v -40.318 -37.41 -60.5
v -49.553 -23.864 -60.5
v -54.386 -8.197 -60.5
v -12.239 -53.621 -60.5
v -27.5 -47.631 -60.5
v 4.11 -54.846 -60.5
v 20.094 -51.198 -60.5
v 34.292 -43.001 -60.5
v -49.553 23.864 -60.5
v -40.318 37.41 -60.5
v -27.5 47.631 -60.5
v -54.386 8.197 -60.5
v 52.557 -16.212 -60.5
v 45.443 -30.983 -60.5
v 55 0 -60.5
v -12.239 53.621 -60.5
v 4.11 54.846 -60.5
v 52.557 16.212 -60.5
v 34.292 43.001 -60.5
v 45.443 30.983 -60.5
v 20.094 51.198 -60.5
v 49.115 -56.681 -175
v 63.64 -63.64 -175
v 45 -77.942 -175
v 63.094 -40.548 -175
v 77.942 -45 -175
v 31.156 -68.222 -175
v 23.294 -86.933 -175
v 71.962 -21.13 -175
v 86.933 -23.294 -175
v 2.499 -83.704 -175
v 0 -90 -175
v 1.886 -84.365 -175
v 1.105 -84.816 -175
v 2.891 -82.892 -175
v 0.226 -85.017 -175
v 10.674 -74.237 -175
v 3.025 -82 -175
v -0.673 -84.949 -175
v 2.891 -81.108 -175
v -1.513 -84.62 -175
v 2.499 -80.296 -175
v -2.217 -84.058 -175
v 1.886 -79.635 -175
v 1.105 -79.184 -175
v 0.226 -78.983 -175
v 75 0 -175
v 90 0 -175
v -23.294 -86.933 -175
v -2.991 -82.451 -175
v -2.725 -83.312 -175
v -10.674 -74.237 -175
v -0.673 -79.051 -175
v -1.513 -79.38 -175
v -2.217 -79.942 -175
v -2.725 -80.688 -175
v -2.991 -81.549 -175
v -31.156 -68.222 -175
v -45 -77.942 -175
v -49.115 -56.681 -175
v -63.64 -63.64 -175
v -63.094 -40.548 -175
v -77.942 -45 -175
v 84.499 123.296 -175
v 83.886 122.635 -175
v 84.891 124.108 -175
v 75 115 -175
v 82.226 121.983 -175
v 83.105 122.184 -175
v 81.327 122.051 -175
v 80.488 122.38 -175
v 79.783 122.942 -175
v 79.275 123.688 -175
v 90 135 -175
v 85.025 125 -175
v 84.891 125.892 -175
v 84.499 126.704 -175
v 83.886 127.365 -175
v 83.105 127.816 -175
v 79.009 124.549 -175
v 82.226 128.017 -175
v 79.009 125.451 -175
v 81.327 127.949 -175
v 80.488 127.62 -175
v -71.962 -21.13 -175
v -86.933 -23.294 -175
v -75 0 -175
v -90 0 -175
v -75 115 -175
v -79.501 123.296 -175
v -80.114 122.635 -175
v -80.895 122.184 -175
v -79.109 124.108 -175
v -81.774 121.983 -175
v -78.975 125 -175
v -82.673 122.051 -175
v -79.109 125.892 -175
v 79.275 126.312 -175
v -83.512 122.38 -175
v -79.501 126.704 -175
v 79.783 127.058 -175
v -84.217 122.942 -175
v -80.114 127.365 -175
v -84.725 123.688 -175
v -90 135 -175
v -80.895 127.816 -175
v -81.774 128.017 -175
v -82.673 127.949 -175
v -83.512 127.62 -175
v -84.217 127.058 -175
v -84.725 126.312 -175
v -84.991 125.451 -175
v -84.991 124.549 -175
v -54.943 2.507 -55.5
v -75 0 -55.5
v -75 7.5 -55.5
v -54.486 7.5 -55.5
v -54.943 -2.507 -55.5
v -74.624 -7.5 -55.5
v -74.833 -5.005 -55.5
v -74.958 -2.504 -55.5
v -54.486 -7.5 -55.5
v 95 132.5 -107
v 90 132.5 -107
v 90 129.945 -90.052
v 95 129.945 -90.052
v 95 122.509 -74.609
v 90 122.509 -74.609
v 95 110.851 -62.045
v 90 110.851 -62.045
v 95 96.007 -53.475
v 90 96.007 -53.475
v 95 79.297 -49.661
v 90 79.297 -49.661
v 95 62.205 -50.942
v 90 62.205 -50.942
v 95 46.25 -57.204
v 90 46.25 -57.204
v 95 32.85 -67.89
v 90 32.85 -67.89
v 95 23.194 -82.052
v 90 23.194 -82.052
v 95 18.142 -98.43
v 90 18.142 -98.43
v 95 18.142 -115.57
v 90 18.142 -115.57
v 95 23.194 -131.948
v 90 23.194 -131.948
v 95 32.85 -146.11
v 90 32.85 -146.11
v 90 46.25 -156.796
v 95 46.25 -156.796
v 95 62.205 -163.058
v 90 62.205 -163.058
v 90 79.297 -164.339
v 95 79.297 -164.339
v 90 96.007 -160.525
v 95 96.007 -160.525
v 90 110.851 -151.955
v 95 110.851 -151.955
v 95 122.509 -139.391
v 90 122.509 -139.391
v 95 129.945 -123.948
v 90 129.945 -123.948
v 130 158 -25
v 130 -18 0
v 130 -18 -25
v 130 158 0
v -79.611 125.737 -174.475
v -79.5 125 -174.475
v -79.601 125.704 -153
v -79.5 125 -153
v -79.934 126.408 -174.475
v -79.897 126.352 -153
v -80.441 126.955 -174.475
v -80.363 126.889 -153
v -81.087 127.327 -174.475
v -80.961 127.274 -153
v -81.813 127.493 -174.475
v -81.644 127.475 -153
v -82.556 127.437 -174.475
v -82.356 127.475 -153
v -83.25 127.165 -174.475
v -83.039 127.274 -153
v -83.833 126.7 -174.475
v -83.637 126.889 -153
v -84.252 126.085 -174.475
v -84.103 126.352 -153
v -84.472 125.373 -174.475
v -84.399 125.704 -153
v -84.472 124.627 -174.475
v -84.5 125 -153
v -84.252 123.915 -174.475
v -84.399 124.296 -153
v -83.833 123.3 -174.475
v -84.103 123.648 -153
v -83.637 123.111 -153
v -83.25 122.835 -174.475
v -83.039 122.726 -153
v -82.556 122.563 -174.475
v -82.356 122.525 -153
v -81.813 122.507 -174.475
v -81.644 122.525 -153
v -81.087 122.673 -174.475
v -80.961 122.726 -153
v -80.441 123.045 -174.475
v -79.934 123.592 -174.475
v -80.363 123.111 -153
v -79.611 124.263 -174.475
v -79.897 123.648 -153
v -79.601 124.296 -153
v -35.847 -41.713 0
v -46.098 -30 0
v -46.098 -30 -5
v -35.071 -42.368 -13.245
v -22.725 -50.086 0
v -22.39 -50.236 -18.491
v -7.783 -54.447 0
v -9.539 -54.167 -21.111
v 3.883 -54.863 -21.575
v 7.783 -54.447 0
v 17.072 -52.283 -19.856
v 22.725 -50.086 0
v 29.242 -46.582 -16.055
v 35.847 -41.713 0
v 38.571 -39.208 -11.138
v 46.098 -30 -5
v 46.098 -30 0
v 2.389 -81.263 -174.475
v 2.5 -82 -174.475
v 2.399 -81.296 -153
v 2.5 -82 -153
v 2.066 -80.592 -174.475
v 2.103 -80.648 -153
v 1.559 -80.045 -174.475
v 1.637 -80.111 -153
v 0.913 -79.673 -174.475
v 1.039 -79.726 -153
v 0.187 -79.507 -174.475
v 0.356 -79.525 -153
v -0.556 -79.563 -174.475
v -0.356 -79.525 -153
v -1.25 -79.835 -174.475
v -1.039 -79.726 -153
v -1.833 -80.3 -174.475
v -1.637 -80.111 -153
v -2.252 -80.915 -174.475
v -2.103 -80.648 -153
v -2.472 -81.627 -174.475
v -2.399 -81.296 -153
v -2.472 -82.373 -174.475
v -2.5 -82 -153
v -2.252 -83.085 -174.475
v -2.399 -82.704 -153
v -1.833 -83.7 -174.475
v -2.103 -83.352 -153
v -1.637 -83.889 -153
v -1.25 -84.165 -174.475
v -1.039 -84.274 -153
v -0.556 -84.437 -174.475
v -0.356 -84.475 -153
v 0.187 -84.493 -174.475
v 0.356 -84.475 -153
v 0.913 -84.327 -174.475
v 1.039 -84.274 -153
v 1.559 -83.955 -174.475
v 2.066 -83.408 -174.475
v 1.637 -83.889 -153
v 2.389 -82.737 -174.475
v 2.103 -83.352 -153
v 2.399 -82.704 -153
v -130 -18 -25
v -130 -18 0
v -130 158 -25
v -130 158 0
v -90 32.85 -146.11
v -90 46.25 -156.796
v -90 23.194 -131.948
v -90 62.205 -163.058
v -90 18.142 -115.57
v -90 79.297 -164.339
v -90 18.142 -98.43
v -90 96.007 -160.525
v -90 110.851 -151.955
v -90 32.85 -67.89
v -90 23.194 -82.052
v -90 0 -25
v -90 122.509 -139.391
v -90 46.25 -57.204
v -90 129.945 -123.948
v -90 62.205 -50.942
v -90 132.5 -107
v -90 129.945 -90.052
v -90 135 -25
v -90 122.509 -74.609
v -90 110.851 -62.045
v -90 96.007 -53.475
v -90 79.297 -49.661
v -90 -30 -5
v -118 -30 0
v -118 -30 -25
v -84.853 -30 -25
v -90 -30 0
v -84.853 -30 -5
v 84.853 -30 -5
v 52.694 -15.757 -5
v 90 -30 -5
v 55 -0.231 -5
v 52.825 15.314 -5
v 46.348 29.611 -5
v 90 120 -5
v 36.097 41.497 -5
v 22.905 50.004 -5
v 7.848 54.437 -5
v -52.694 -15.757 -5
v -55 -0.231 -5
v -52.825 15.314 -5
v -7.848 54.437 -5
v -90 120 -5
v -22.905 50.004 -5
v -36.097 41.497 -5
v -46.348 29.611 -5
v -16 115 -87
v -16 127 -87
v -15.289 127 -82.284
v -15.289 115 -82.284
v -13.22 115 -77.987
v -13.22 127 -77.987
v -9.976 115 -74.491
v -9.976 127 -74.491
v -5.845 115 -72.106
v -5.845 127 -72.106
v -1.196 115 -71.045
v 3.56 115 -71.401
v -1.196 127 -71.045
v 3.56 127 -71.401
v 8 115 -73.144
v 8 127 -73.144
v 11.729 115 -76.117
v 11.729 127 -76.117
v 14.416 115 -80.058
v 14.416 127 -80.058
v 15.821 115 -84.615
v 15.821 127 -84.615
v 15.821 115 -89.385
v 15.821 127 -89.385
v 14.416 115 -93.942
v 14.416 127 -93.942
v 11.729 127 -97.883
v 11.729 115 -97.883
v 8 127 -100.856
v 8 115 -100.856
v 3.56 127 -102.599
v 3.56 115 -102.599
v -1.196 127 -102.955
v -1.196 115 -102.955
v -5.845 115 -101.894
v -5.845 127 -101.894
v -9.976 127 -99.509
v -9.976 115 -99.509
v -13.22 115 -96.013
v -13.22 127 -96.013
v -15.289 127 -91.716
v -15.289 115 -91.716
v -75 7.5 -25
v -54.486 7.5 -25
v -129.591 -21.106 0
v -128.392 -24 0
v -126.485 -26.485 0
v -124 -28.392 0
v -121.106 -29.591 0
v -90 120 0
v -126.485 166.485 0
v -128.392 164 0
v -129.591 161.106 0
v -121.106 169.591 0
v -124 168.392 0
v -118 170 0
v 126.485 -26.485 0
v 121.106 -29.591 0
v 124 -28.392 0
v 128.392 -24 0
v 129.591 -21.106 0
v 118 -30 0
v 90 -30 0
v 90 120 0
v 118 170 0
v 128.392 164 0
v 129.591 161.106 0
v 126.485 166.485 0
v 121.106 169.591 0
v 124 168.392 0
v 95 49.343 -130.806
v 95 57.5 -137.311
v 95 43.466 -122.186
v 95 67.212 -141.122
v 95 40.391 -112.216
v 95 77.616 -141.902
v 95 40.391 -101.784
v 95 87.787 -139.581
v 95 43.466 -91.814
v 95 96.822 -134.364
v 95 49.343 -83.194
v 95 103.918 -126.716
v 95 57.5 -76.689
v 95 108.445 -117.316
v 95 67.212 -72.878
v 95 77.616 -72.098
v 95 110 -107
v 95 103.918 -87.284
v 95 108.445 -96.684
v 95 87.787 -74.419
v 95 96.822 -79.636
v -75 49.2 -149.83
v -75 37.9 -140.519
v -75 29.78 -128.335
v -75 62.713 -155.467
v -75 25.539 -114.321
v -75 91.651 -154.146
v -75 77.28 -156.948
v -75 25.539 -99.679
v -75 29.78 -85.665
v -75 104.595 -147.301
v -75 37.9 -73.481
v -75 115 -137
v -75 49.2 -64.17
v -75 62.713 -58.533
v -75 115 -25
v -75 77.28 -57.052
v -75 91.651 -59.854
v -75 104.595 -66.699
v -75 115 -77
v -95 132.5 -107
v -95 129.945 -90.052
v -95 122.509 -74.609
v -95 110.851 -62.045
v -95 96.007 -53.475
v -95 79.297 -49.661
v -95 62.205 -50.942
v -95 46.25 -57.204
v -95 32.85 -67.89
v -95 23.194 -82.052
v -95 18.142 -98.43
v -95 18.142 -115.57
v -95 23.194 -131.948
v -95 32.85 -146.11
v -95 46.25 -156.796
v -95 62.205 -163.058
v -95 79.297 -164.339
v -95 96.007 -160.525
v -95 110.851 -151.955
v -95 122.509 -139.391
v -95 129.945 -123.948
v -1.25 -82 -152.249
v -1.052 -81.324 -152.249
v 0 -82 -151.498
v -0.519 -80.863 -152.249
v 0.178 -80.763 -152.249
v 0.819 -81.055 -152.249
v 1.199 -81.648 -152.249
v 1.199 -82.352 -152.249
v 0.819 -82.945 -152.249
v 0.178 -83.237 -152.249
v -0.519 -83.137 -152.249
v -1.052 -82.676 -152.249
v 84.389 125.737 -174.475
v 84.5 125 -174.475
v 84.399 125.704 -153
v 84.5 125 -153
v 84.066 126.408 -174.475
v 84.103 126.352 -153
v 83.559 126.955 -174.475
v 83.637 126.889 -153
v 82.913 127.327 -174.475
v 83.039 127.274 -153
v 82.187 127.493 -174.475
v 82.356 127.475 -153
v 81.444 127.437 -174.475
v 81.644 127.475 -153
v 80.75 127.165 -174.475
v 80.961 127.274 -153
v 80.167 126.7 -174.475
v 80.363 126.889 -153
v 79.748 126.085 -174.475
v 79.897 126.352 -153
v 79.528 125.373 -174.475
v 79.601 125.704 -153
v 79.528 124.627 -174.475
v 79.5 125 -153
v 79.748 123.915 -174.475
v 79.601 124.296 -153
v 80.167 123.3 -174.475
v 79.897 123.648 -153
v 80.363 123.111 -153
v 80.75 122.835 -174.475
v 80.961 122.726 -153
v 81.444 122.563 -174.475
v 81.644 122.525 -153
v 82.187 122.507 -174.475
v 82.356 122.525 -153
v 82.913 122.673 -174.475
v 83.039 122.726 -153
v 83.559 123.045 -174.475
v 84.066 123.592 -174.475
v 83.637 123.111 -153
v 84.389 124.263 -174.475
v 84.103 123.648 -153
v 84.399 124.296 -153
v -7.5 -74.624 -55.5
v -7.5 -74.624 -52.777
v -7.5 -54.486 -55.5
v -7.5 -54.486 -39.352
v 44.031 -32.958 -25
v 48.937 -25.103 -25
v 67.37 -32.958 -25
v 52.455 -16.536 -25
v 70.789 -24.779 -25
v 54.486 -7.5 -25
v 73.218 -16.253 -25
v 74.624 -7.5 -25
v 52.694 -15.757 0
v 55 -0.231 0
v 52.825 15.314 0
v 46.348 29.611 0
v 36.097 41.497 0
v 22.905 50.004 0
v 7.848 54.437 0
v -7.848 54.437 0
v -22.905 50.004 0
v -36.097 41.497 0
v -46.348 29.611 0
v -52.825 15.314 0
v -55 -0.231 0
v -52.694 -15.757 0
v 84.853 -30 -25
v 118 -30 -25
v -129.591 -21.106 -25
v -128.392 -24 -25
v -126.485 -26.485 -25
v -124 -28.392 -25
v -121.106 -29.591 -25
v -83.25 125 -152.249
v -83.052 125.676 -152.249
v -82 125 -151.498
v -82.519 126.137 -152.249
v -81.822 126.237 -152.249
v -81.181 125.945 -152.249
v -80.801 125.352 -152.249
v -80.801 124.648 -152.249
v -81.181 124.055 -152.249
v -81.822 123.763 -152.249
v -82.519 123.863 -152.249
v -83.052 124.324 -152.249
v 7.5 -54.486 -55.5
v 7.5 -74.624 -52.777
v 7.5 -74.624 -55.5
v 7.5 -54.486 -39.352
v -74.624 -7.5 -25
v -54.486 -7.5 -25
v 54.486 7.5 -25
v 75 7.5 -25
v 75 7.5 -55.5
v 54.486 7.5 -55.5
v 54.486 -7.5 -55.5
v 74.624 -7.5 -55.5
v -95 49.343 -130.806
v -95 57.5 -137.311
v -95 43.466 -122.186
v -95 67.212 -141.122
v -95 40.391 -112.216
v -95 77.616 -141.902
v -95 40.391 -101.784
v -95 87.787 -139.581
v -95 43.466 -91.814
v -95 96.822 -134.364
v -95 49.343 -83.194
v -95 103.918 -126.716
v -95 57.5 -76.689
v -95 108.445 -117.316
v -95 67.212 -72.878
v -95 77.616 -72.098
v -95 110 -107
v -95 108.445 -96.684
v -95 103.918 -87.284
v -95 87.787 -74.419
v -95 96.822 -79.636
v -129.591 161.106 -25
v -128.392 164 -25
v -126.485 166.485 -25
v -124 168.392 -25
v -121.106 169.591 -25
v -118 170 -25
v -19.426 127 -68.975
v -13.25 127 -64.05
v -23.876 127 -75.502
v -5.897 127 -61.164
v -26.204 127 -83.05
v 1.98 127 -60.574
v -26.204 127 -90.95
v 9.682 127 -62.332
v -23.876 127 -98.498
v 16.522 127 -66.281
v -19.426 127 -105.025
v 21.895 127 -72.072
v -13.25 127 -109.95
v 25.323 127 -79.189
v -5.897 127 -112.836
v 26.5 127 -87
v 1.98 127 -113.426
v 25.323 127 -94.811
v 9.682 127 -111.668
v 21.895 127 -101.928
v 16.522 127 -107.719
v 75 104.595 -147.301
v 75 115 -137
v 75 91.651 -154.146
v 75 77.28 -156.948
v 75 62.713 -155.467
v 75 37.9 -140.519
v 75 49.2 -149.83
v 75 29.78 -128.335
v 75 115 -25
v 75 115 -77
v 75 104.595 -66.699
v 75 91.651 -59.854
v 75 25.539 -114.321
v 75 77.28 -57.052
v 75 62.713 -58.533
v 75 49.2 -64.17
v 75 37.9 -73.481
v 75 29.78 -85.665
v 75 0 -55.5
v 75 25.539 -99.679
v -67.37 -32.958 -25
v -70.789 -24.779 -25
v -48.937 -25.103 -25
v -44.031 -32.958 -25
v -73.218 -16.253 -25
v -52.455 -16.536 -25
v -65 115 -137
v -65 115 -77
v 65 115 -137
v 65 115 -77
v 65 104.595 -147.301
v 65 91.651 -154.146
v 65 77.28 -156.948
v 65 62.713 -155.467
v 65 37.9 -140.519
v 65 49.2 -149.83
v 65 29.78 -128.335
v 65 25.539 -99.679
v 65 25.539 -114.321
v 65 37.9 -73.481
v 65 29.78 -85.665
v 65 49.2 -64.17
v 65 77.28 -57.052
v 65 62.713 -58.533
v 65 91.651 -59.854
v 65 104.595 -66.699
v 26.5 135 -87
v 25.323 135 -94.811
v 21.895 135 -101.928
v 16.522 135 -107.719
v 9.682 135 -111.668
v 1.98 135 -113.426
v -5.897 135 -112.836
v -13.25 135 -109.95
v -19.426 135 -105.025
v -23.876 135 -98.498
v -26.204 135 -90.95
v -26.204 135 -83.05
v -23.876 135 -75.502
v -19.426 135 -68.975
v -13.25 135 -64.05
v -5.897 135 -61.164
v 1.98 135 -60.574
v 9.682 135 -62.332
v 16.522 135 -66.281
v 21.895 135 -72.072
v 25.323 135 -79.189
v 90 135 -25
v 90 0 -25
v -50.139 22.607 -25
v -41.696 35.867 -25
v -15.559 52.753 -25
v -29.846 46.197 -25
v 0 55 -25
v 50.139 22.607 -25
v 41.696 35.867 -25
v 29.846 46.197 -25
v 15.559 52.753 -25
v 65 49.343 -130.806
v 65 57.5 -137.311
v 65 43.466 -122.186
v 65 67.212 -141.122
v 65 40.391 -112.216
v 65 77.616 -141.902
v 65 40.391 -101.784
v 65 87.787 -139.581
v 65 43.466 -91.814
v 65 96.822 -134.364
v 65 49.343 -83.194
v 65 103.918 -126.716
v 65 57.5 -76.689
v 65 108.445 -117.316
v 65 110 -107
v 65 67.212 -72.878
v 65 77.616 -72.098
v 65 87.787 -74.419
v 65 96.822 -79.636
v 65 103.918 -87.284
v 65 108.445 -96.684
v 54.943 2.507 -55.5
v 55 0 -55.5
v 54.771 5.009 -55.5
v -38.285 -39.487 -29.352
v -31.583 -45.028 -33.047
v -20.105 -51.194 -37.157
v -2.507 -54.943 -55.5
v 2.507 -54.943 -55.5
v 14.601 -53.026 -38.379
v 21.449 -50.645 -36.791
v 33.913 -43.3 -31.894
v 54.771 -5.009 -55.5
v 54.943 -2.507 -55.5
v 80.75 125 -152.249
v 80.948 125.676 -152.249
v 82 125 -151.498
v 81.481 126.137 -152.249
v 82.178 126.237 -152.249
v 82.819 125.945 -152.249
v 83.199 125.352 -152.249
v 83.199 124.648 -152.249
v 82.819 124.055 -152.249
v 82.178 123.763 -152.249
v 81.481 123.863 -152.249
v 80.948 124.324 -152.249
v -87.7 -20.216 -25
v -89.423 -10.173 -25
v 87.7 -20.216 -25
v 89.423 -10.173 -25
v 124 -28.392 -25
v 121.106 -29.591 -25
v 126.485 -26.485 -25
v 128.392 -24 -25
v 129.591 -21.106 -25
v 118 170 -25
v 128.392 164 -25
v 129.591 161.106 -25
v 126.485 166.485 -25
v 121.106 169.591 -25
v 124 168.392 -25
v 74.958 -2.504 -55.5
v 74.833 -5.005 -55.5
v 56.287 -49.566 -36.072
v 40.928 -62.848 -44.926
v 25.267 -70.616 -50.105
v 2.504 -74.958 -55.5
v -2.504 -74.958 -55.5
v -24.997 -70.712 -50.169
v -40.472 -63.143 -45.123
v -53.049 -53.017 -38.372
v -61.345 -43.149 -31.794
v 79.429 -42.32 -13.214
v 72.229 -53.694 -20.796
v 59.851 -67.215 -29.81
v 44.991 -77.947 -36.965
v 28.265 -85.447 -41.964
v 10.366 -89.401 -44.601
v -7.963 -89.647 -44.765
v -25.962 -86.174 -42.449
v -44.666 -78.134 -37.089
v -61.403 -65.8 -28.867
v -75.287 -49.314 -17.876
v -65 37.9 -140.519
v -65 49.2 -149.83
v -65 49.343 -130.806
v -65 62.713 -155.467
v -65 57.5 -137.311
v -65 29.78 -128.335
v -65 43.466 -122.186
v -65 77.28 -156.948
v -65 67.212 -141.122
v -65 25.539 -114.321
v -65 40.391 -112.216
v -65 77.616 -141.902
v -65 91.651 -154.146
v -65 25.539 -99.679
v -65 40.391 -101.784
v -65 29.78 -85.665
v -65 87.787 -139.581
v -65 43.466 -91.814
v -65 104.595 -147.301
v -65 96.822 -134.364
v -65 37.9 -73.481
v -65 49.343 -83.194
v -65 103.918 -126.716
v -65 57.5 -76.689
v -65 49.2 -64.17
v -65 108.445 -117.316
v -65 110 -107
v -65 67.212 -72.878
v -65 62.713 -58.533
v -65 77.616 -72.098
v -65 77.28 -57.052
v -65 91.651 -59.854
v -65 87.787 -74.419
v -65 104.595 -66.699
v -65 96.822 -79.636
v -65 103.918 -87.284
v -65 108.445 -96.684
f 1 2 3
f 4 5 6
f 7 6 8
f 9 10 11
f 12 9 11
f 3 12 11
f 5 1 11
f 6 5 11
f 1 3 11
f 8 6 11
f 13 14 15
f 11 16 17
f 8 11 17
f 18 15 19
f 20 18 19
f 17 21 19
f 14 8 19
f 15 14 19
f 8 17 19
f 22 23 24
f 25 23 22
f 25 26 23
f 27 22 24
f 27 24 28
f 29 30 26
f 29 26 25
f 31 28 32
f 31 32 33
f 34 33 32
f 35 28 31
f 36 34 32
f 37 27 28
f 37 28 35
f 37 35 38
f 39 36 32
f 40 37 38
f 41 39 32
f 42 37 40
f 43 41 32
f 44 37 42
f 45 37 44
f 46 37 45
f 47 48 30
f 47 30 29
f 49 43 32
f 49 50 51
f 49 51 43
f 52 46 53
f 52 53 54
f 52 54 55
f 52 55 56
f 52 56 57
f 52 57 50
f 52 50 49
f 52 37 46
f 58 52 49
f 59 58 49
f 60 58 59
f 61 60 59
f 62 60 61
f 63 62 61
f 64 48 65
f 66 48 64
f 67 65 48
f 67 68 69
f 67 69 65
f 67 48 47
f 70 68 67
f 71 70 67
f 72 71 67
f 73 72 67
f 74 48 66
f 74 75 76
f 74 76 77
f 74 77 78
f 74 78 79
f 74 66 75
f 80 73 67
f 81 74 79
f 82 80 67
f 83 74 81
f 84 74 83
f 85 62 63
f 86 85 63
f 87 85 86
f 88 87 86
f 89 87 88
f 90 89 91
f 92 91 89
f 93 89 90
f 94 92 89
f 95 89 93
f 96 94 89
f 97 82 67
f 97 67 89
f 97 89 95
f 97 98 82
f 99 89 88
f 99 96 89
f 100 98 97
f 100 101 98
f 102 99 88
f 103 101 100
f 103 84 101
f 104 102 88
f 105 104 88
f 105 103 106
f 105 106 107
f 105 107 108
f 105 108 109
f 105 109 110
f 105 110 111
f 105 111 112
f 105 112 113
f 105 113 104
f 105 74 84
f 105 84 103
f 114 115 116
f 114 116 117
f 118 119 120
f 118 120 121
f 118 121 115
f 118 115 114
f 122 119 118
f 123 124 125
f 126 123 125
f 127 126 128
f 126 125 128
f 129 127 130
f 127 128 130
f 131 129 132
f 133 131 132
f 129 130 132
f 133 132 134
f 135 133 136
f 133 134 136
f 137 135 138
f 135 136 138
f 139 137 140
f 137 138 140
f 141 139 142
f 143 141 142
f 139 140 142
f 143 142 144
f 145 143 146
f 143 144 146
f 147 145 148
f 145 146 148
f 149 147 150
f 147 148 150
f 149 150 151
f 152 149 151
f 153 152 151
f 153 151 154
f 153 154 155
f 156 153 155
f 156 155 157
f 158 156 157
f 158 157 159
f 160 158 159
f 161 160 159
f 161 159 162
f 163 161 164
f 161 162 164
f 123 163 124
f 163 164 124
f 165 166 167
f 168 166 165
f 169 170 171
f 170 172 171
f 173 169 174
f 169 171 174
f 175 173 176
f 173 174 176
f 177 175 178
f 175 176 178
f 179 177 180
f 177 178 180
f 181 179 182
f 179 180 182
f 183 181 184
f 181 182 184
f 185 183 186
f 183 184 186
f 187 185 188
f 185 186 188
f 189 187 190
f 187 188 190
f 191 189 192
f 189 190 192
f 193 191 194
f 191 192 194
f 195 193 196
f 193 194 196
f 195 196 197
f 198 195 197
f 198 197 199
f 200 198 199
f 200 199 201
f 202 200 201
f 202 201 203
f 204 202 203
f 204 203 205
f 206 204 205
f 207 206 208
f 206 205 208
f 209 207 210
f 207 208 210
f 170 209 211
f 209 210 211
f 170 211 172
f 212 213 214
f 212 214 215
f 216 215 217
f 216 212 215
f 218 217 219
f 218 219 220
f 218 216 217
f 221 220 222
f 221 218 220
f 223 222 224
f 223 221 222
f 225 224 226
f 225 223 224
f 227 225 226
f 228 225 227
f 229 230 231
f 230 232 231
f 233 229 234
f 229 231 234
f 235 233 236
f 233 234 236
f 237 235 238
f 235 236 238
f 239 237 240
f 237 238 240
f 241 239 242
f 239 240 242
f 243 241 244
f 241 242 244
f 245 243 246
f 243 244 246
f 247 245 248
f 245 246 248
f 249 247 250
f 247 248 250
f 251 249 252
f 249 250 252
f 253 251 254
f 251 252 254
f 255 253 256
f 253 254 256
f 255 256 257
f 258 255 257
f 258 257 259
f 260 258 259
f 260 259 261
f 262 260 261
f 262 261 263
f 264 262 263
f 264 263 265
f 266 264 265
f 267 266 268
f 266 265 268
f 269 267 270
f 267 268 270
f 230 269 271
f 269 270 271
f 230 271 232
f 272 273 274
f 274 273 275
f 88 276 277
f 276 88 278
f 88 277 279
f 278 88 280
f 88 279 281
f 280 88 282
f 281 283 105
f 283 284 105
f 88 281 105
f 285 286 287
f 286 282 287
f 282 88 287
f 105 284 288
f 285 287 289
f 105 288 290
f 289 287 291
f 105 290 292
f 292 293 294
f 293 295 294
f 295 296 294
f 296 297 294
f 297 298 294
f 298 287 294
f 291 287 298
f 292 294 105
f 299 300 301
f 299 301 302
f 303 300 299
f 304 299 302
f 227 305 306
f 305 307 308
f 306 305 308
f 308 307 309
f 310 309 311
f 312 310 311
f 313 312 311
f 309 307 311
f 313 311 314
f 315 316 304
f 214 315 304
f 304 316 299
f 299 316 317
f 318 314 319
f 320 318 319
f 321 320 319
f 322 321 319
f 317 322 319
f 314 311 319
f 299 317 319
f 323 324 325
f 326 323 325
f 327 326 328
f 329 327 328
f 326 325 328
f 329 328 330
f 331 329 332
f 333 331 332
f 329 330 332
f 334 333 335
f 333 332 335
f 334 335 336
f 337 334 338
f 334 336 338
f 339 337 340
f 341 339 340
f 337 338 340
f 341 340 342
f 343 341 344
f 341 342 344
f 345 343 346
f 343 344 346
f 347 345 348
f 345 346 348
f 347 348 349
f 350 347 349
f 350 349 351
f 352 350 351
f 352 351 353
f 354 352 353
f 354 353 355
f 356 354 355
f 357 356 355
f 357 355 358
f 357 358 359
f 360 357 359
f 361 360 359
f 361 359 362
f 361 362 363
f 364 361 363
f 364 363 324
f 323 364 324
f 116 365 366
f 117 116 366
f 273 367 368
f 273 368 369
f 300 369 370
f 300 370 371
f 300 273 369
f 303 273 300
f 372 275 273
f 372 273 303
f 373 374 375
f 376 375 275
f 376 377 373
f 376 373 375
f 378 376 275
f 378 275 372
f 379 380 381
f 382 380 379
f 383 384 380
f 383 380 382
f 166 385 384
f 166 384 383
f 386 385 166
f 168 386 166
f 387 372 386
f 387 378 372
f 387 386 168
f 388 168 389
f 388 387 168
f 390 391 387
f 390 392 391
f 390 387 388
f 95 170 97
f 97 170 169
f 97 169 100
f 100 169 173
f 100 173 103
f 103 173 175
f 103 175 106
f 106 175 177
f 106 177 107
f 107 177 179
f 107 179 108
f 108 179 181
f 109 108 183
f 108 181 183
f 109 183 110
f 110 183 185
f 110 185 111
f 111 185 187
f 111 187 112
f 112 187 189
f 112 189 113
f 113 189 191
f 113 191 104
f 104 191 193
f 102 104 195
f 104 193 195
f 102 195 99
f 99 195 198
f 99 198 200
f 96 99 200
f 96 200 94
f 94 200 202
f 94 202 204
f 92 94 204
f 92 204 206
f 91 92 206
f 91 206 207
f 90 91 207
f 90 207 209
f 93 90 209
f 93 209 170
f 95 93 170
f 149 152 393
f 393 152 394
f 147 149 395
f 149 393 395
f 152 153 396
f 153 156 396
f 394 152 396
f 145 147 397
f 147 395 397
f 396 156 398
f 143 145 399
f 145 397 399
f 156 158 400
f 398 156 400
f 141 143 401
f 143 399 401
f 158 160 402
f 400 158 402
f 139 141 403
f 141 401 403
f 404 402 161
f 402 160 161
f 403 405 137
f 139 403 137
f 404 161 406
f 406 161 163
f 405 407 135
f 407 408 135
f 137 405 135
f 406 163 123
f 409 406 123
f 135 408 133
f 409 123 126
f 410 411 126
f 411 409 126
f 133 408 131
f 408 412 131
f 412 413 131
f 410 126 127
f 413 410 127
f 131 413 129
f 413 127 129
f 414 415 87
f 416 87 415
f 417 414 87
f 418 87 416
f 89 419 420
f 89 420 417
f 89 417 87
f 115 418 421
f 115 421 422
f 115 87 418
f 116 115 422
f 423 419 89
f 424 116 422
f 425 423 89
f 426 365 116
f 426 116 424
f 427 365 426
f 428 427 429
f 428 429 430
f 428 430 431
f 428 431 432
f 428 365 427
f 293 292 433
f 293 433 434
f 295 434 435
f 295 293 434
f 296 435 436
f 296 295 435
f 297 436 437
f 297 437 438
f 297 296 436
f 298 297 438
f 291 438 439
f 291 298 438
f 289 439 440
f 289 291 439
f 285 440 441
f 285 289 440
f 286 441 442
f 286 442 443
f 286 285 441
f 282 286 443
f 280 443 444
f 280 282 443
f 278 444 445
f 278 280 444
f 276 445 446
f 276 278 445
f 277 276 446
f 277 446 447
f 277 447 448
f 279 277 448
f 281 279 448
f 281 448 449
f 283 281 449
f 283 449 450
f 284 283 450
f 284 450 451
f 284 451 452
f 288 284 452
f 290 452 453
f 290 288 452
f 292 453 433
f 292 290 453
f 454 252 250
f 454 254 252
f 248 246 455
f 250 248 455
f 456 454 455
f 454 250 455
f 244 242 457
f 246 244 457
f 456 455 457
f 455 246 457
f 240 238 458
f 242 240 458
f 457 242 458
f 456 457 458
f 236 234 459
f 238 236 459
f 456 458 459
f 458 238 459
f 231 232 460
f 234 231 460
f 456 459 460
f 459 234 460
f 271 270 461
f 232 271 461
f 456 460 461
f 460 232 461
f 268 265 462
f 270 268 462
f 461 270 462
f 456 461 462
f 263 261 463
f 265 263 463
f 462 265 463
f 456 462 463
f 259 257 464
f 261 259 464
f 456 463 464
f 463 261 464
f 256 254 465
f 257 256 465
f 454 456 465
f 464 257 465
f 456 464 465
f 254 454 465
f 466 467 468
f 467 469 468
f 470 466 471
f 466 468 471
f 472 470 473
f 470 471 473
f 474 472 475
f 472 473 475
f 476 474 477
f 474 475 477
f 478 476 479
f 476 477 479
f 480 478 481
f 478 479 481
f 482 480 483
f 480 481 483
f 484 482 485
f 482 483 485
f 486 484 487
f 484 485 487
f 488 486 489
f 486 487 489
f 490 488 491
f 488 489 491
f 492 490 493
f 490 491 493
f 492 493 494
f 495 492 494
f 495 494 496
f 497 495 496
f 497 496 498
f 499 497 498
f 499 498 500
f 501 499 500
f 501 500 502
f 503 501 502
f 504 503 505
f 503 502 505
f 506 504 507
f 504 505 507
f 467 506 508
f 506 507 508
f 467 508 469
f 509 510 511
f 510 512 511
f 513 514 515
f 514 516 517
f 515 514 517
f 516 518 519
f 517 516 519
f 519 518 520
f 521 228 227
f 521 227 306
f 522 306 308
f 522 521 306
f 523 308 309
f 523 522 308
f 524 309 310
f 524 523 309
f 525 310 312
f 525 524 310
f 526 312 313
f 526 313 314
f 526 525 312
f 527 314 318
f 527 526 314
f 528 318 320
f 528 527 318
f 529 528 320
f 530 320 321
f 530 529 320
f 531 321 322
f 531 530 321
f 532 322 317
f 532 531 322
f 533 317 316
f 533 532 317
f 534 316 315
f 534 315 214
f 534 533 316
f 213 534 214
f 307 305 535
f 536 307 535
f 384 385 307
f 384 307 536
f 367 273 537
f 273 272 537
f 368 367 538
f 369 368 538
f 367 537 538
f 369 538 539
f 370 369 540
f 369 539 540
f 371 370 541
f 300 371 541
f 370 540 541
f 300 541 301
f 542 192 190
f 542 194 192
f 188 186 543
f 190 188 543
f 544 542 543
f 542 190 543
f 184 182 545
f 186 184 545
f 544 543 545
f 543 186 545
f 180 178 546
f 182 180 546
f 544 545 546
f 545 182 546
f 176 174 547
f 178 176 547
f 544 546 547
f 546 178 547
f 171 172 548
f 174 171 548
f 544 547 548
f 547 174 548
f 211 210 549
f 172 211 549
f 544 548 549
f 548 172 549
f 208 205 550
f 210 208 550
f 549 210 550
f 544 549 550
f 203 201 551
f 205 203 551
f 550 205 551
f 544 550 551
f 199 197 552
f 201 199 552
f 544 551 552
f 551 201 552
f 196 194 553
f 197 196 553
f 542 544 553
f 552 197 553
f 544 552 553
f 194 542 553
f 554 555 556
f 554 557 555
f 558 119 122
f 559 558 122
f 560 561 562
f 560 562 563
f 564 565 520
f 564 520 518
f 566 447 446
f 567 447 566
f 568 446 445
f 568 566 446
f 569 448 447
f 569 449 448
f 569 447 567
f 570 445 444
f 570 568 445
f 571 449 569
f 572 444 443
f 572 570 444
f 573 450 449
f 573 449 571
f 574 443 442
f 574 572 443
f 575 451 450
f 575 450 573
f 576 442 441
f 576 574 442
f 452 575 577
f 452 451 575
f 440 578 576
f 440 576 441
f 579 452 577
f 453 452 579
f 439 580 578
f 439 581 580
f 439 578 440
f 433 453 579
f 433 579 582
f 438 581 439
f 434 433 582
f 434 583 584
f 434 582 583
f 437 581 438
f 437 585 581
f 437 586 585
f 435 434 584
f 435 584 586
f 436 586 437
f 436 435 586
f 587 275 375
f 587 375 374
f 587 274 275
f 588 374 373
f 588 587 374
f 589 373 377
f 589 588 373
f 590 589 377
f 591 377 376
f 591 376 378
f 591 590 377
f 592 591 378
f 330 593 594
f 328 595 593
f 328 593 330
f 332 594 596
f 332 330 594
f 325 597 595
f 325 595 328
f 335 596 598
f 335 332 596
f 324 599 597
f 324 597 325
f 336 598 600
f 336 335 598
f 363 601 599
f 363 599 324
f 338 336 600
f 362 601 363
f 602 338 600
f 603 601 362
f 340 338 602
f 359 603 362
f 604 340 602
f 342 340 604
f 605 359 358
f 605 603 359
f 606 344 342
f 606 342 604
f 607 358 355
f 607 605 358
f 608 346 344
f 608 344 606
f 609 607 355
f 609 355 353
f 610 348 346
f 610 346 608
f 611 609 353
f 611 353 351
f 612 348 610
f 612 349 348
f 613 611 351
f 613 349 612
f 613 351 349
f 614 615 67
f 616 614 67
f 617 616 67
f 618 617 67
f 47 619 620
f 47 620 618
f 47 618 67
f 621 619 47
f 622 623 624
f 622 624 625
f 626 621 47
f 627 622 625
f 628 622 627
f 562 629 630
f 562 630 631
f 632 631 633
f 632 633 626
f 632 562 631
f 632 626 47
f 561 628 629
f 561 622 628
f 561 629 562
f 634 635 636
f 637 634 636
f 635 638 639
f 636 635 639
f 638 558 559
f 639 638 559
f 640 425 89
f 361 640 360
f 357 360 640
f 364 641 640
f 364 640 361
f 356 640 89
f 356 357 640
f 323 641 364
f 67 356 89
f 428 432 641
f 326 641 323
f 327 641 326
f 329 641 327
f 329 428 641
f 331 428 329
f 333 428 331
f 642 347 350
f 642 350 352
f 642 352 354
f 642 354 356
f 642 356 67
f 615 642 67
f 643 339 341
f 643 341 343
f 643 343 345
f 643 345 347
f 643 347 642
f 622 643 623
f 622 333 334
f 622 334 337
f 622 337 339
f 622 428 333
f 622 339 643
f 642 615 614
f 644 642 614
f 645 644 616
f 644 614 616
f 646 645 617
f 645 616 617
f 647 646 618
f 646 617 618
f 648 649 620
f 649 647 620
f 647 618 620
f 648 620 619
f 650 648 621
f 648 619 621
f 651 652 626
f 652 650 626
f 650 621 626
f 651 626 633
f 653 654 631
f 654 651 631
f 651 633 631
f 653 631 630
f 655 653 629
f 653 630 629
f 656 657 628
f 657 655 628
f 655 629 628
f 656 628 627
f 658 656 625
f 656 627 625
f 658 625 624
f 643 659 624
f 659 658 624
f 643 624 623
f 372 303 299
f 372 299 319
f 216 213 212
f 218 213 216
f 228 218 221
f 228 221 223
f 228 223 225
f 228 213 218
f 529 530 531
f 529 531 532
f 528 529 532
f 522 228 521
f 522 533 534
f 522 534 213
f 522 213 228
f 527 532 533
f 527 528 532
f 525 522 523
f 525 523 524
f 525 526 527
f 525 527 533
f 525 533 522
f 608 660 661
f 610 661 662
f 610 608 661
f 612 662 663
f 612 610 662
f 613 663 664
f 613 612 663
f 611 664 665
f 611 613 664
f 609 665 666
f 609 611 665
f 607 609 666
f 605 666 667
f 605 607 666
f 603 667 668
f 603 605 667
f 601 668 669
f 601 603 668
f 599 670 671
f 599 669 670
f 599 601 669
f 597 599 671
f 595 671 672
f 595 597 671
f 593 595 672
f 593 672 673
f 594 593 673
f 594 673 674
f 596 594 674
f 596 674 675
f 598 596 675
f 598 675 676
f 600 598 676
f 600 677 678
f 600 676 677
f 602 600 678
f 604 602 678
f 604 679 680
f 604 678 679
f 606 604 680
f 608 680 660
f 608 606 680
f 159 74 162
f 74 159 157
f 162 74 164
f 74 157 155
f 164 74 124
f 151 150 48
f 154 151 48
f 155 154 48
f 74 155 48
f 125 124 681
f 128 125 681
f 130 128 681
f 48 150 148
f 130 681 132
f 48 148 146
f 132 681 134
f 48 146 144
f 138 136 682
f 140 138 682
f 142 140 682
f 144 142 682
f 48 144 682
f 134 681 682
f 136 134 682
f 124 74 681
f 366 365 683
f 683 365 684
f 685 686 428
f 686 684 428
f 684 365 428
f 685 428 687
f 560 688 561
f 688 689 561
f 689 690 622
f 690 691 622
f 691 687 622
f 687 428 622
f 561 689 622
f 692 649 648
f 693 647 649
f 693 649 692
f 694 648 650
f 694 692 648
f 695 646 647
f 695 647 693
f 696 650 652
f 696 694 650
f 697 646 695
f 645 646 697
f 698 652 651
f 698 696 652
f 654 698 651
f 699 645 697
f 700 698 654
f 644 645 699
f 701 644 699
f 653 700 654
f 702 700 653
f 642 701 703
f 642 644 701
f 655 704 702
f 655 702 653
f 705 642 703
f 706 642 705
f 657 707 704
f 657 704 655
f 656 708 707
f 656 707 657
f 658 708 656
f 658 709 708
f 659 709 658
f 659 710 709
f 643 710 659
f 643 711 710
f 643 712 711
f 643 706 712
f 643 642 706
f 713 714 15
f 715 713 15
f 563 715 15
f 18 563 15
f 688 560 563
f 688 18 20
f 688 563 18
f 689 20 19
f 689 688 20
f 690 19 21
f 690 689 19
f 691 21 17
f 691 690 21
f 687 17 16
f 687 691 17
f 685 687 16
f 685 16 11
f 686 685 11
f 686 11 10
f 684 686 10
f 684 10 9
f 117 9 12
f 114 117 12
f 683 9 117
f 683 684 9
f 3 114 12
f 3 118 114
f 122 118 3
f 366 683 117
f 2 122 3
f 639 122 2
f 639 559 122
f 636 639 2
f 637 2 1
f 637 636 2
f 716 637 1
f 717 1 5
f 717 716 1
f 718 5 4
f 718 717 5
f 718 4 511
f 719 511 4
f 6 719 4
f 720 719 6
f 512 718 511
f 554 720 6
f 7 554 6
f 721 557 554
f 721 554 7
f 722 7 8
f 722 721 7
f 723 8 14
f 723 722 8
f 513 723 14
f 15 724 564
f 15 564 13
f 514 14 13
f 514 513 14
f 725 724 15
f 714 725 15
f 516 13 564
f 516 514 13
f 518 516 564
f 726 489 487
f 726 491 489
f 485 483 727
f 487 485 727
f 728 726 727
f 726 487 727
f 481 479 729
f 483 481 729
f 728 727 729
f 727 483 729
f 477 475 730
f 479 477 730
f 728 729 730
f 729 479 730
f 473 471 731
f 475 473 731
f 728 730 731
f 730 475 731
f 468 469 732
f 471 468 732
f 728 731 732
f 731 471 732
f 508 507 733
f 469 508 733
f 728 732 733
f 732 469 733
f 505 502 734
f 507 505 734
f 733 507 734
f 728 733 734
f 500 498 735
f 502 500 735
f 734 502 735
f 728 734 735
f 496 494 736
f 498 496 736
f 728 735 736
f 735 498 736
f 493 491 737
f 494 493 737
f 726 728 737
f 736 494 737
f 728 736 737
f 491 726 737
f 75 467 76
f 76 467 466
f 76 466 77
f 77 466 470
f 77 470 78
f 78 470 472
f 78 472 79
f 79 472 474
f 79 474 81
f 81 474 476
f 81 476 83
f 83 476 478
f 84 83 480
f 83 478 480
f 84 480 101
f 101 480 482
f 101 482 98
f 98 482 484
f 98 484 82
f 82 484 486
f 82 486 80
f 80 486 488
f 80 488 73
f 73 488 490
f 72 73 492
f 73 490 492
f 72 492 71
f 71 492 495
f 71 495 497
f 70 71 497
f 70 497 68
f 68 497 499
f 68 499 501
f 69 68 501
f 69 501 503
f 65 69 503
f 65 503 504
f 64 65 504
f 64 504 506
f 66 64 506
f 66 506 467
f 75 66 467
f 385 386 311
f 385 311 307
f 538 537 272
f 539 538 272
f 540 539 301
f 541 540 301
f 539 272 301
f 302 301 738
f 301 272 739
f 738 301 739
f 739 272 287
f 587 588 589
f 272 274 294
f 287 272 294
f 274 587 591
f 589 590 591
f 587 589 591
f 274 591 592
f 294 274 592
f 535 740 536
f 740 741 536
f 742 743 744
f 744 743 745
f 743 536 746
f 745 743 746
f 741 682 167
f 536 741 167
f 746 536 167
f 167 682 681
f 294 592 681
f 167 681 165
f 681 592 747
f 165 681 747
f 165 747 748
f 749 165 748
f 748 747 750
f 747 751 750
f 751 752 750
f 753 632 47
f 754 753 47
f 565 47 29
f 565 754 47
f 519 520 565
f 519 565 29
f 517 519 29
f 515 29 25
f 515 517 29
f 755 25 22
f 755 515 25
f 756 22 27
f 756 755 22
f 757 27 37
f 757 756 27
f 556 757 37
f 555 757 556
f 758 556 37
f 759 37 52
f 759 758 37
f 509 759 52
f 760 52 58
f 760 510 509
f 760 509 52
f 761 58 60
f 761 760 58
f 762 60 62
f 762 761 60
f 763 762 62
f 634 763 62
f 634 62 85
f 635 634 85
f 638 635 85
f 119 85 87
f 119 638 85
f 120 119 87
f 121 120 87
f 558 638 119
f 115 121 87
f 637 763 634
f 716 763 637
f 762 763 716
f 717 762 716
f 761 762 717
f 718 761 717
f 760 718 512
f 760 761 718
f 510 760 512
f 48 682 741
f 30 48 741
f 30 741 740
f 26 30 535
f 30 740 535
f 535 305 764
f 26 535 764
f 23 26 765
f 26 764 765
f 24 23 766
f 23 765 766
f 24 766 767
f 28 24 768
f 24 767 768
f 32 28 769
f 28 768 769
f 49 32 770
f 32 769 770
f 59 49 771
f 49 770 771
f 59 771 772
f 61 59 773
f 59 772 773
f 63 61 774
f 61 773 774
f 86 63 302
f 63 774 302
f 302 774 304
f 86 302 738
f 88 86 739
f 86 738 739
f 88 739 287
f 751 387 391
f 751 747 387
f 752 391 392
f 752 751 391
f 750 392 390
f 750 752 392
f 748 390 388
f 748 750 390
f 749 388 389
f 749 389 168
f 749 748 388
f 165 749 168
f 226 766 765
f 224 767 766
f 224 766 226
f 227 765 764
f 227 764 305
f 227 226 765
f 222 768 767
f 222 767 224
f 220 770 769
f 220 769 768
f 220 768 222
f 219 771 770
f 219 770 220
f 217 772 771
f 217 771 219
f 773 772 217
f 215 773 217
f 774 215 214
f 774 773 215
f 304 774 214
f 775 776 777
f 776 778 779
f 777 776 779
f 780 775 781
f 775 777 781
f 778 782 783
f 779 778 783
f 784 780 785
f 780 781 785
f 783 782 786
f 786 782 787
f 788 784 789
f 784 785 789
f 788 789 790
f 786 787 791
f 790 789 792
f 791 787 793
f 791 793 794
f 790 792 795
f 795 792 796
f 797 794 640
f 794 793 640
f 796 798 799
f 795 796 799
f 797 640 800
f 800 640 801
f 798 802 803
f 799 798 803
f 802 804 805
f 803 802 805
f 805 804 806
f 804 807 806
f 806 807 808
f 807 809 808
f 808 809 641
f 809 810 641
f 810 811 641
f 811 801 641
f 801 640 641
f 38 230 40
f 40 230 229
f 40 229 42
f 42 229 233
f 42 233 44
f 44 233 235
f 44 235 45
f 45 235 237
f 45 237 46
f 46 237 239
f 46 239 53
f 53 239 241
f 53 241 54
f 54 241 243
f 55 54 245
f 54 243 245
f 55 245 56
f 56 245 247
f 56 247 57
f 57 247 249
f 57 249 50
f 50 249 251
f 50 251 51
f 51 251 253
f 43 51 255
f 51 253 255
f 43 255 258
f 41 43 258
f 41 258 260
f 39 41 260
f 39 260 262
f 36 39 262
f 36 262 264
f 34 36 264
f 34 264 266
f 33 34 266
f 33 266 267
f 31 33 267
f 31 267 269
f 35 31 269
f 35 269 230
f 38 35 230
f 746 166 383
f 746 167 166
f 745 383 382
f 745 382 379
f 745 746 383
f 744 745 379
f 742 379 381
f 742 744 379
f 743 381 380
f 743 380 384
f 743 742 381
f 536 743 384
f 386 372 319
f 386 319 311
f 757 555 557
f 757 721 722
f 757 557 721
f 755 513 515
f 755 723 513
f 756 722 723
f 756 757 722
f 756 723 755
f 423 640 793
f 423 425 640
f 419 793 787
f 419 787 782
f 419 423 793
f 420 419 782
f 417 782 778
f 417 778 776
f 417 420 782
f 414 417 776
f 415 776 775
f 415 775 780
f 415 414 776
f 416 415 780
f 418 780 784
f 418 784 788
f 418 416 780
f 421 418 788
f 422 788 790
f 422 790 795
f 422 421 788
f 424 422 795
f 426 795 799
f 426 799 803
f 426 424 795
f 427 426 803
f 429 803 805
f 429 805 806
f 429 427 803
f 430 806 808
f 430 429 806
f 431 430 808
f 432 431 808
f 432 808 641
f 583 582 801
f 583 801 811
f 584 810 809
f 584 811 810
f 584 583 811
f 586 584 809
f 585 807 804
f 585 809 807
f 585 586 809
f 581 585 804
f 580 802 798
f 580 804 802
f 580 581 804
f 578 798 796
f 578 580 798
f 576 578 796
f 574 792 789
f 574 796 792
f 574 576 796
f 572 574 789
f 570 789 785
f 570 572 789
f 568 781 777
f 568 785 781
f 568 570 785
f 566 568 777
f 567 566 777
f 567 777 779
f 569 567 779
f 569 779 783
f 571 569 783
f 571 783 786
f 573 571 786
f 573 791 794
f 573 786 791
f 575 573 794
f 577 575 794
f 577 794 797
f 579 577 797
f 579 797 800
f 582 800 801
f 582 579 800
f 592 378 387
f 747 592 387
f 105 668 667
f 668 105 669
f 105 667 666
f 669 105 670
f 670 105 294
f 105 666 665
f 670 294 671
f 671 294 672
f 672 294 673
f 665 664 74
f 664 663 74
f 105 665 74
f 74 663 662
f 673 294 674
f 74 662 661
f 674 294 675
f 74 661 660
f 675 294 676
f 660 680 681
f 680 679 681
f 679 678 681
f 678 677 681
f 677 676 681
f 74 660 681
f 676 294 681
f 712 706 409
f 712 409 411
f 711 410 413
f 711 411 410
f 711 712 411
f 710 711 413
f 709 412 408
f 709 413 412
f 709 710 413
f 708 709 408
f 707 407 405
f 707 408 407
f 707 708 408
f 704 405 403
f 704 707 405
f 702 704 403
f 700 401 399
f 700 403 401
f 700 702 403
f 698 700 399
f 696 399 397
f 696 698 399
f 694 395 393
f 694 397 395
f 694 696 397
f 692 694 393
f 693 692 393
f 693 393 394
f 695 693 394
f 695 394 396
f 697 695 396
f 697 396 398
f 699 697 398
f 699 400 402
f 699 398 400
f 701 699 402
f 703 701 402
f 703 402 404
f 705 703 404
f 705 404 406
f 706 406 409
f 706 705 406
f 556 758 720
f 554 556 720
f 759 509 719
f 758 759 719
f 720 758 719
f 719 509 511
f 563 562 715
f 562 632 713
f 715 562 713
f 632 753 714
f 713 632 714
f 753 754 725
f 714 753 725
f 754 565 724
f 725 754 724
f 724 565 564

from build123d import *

# Parameters (mm, degrees)
EXTRUDE_START                = -5
EXTRUDE_1_DEPTH              = 170
CUT_EXTRUDE_1_DEPTH          = 239.641991276
CUT_EXTRUDE_1_DEPTH_BACK     = 239.641991276
CUT_EXTRUDE_START            = -121.972243623
CUT_EXTRUDE_2_DEPTH          = 121.972243623
CUT_EXTRUDE_START_2          = -53.027756377
CUT_EXTRUDE_2_2_DEPTH        = 28.027756377
CUT_EXTRUDE_START_3          = -12.480754415
CUT_EXTRUDE_2_3_DEPTH        = 15
SKETCH_5_R                   = 55
EXTRUDE_2_DEPTH              = 60.5
SKETCH_6_W                   = 260
SKETCH_6_H                   = 200
EXTRUDE_3_DEPTH              = 25
CUT_EXTRUDE_3_DEPTH          = 5
FILLET_1_R                   = 12
SKETCH_9_R                   = 57.5
EXTRUDE_4_DEPTH              = 5
SKETCH_10_R                  = 50
EXTRUDE_5_DEPTH              = 30
CUT_EXTRUDE_4_DEPTH          = 332.888535558
CUT_EXTRUDE_4_DEPTH_BACK     = 332.888535558
SKETCH_11_R                  = 35
CUT_EXTRUDE_5_DEPTH          = 314.289004012
CUT_EXTRUDE_5_DEPTH_BACK     = 8
SKETCH_12_R                  = 26.5
CUT_EXTRUDE_6_REACH          = 309.594
SKETCH_13_R                  = 16
RIB_START                    = -7.5
RIB_1_DEPTH                  = 15
RIB_2_REACH                  = 278.451
SKETCH_15_WALL_W             = 586.29307431
SKETCH_15_WALL_H             = 15
HOLE_WIZARD_M6_1_D           = 5
HOLE_WIZARD_M6_1_DEPTH       = 22
HOLE_WIZARD_M6_1_CSINK_D     = 6.05
HOLE_WIZARD_M6_1_CSINK_ANGLE = 90
HOLE_WIZARD_M6_1_TIP         = 1.502151548
HOLE_WIZARD_M6_2_D           = 5
HOLE_WIZARD_M6_2_DEPTH       = 22
HOLE_WIZARD_M6_2_CSINK_D     = 6.05
HOLE_WIZARD_M6_2_CSINK_ANGLE = 90
HOLE_WIZARD_M6_2_TIP         = 1.502151548


with BuildPart() as part:
    # 草图1 → 凸台-拉伸1 (new body)
    with BuildSketch(Plane.XY.offset(EXTRUDE_START)):
        with BuildLine():
            Line((-90, 0), (-90, 135))
            Line((-90, 135), (90, 135))
            Line((90, 135), (90, 0))
            ThreePointArc((90, 0), (0, -90), (-90, 0))
        make_face()
    extrude(amount=-EXTRUDE_1_DEPTH)

    # 草图2 → 切除-拉伸1 (cut, two sides: drawn at the far end of the back side and taken through both)
    with BuildSketch(Plane(origin=(0, 0, 0), x_dir=(0, 0, -1), z_dir=(1, 0, 0)).offset(-CUT_EXTRUDE_1_DEPTH_BACK)):
        Polygon((338.831049921, -530.746574882), (45, -90), (5, -30), (-288.831049921, 410.746574882), (-1170.324199685, -176.915524961), (-542.662099843, -1118.408674725), align=None)
    extrude(amount=CUT_EXTRUDE_1_DEPTH + CUT_EXTRUDE_1_DEPTH_BACK, mode=Mode.SUBTRACT)

    # 切除-拉伸2: read off the stored shape, not the designer's step
    # 切除-拉伸2 outline → 切除-拉伸2 (cut)
    with BuildSketch(Plane(origin=(0, 0, -175), x_dir=(-1, 0, 0), z_dir=(0, 0, -1)).offset(CUT_EXTRUDE_START)):
        with BuildLine():
            Line((75, 115), (-75, 115))
            Line((-75, 115), (-75, 0))
            ThreePointArc((-75, 0), (0, -75), (75, 0))
            Line((75, 0), (75, 115))
        make_face()
    extrude(amount=CUT_EXTRUDE_2_DEPTH, mode=Mode.SUBTRACT)

    # Cut-Extrude 2 2 outline → Cut-Extrude 2 2 (cut)
    with BuildSketch(Plane.XY.offset(CUT_EXTRUDE_START_2)):
        with BuildLine():
            ThreePointArc((-75, 0), (0, -75), (75, 0))
            Line((75, 0), (75, 115))
            Line((75, 115), (-75, 115))
            Line((-75, 115), (-75, 0))
        make_face()
    extrude(amount=CUT_EXTRUDE_2_2_DEPTH, mode=Mode.SUBTRACT)

    # Cut-Extrude 2 3 outline → Cut-Extrude 2 3 (add)
    with BuildSketch(Plane(origin=(0, 0, 0), x_dir=(1, 0, 0), z_dir=(0, 0.5547001962252289, -0.8320502943378438)).offset(CUT_EXTRUDE_START_3)):
        with BuildLine():
            Line((-67.370217069, 41.290522566), (67.370217069, 41.290522566))
            add(Edge.make_bspline(
                [(67.370217069, 41.290522566), (0, 206.799154918), (-67.370217069, 41.290522566)],
                knots=[5.167369564, 5.167369564, 5.167369564, 7.399001051, 7.399001051, 7.399001051], degree=2, weights=[1, 0.439444872, 1]))
        make_face()
    extrude(amount=CUT_EXTRUDE_2_3_DEPTH)

    # 草图5 → 凸台-拉伸2 (add)
    with BuildSketch(Plane.XY):
        Circle(SKETCH_5_R)
    extrude(amount=-EXTRUDE_2_DEPTH)

    # 草图6 → 凸台-拉伸3 (add)
    with BuildSketch(Plane.XY):
        with Locations((0, 70)):
            Rectangle(SKETCH_6_W, SKETCH_6_H)
    extrude(amount=-EXTRUDE_3_DEPTH)

    # 草图8 → 切除-拉伸3 (cut)
    with BuildSketch(Plane.XY):
        with BuildLine():
            Line((-90, -30), (-90, 120))
            Line((-90, 120), (90, 120))
            Line((90, 120), (90, -30))
            Line((90, -30), (46.097722286, -30))
            ThreePointArc((46.097722286, -30), (0, 55), (-46.097722286, -30))
            Line((-46.097722286, -30), (-90, -30))
        make_face()
    extrude(amount=-CUT_EXTRUDE_3_DEPTH, mode=Mode.SUBTRACT)

    # 圆角1
    fillet_1_edges = [part.edges().sort_by_distance(p)[0] for p in [
        (130, -30, -12.5),
        (130, 170, -12.5),
        (-130, -30, -12.5),
        (-130, 170, -12.5),
    ]]
    fillet(fillet_1_edges, radius=FILLET_1_R)

    # 草图9 → 凸台-拉伸4 (add)
    with BuildSketch(Plane(origin=(90, 0, 0), x_dir=(0, 0, -1), z_dir=(1, 0, 0))):
        with Locations(Location((107, 75, 0), (0, 0, 90))):
            Circle(SKETCH_9_R)
    extrude_4 = extrude(amount=EXTRUDE_4_DEPTH)

    # 草图10 → 凸台-拉伸5 (add)
    with BuildSketch(Plane.ZY.offset(-95)):
        with Locations((-107, 75)):
            Circle(SKETCH_10_R)
    extrude_5 = extrude(amount=EXTRUDE_5_DEPTH)

    # 镜向1: 凸台-拉伸4, 凸台-拉伸5 across plane
    add(extrude_4.mirror(Plane(origin=(0, 0, 0), x_dir=(0, 0, 1), z_dir=(1, 0, 0))))
    add(extrude_5.mirror(Plane(origin=(0, 0, 0), x_dir=(0, 0, 1), z_dir=(1, 0, 0))))

    # 草图11 → 切除-拉伸4 (cut, two sides: drawn at the far end of the back side and taken through both)
    with BuildSketch(Plane(origin=(95, 0, 0), x_dir=(0, 0, -1), z_dir=(1, 0, 0)).offset(-CUT_EXTRUDE_4_DEPTH_BACK)):
        with Locations(Location((107, 75, 0), (0, 0, 90))):
            Circle(SKETCH_11_R)
    extrude(amount=CUT_EXTRUDE_4_DEPTH + CUT_EXTRUDE_4_DEPTH_BACK, mode=Mode.SUBTRACT)

    # 草图12 → 切除-拉伸5 (cut, two sides: drawn at the far end of the back side and taken through both)
    with BuildSketch(Plane(origin=(0, 135, 0), x_dir=(1, 0, 0), z_dir=(0, 1, 0)).offset(-CUT_EXTRUDE_5_DEPTH_BACK)):
        with Locations((0, 87)):
            Circle(SKETCH_12_R)
    extrude(amount=CUT_EXTRUDE_5_DEPTH + CUT_EXTRUDE_5_DEPTH_BACK, mode=Mode.SUBTRACT)

    # 草图13 → 切除-拉伸6 (cut, up to next)
    with BuildSketch(Plane(origin=(0, 127, 0), x_dir=(1, 0, 0), z_dir=(0, 1, 0)), mode=Mode.PRIVATE) as cut_extrude_6_sk1:
        with Locations(Location((0, 87, 0), (0, 0, 180))):
            Circle(SKETCH_13_R)
    cut_extrude_6_tool1 = extrude(cut_extrude_6_sk1.sketch, amount=-CUT_EXTRUDE_6_REACH, mode=Mode.PRIVATE) & part.part
    add(cut_extrude_6_tool1.solids().sort_by_distance((0, 127, -87))[0], mode=Mode.SUBTRACT)

    # 筋1: read off the stored shape, not the designer's step
    # 筋1 outline → 筋1 (add)
    with BuildSketch(Plane(origin=(0, 0, 0), x_dir=(0, 0, -1), z_dir=(1, 0, 0)).offset(RIB_START)):
        Polygon((55.5, -76), (55.5, -53), (38.361089711, -53), (53.027756377, -75), (53.694423044, -76), align=None)
    extrude(amount=RIB_1_DEPTH)

    # 草图15 wall → 筋2 (add, up to next)
    with BuildSketch(Plane(origin=(59.304181844, 0, -55.5), x_dir=(-1, 0, 0), z_dir=(0, 0, 1)), mode=Mode.PRIVATE) as rib_2_sk1:
        Rectangle(SKETCH_15_WALL_W, SKETCH_15_WALL_H)
    rib_2_tool1 = extrude(rib_2_sk1.sketch, amount=RIB_2_REACH, mode=Mode.PRIVATE) - part.part
    rib_2 = rib_2_tool1.solids().sort_by_distance((59.304181844, 0, -55.5))[0]
    add(rib_2)

    # 镜向4: 筋2 across plane
    add(rib_2.mirror(Plane(origin=(0, 0, 0), x_dir=(0, 0, 1), z_dir=(1, 0, 0))))

    # M6 螺纹孔1
    with Locations(Plane(origin=(0, 0, -175), x_dir=(-1, 0, 0), z_dir=(0, 0, -1))):
        with Locations((82, 125), (-82, 125)):
            CounterSinkHole(HOLE_WIZARD_M6_1_D / 2, HOLE_WIZARD_M6_1_CSINK_D / 2, depth=HOLE_WIZARD_M6_1_DEPTH, counter_sink_angle=HOLE_WIZARD_M6_1_CSINK_ANGLE)
            with Locations((0, 0, -(HOLE_WIZARD_M6_1_DEPTH + HOLE_WIZARD_M6_1_TIP / 2))):  # 118° drill point
                Cone(0, HOLE_WIZARD_M6_1_D / 2, HOLE_WIZARD_M6_1_TIP, mode=Mode.SUBTRACT)

    # M6 螺纹孔2
    with Locations(Plane(origin=(0, 0, -175), x_dir=(-1, 0, 0), z_dir=(0, 0, -1))):
        with Locations((0, -82)):
            CounterSinkHole(HOLE_WIZARD_M6_2_D / 2, HOLE_WIZARD_M6_2_CSINK_D / 2, depth=HOLE_WIZARD_M6_2_DEPTH, counter_sink_angle=HOLE_WIZARD_M6_2_CSINK_ANGLE)
            with Locations((0, 0, -(HOLE_WIZARD_M6_2_DEPTH + HOLE_WIZARD_M6_2_TIP / 2))):  # 118° drill point
                Cone(0, HOLE_WIZARD_M6_2_D / 2, HOLE_WIZARD_M6_2_TIP, mode=Mode.SUBTRACT)


solid = part.part
